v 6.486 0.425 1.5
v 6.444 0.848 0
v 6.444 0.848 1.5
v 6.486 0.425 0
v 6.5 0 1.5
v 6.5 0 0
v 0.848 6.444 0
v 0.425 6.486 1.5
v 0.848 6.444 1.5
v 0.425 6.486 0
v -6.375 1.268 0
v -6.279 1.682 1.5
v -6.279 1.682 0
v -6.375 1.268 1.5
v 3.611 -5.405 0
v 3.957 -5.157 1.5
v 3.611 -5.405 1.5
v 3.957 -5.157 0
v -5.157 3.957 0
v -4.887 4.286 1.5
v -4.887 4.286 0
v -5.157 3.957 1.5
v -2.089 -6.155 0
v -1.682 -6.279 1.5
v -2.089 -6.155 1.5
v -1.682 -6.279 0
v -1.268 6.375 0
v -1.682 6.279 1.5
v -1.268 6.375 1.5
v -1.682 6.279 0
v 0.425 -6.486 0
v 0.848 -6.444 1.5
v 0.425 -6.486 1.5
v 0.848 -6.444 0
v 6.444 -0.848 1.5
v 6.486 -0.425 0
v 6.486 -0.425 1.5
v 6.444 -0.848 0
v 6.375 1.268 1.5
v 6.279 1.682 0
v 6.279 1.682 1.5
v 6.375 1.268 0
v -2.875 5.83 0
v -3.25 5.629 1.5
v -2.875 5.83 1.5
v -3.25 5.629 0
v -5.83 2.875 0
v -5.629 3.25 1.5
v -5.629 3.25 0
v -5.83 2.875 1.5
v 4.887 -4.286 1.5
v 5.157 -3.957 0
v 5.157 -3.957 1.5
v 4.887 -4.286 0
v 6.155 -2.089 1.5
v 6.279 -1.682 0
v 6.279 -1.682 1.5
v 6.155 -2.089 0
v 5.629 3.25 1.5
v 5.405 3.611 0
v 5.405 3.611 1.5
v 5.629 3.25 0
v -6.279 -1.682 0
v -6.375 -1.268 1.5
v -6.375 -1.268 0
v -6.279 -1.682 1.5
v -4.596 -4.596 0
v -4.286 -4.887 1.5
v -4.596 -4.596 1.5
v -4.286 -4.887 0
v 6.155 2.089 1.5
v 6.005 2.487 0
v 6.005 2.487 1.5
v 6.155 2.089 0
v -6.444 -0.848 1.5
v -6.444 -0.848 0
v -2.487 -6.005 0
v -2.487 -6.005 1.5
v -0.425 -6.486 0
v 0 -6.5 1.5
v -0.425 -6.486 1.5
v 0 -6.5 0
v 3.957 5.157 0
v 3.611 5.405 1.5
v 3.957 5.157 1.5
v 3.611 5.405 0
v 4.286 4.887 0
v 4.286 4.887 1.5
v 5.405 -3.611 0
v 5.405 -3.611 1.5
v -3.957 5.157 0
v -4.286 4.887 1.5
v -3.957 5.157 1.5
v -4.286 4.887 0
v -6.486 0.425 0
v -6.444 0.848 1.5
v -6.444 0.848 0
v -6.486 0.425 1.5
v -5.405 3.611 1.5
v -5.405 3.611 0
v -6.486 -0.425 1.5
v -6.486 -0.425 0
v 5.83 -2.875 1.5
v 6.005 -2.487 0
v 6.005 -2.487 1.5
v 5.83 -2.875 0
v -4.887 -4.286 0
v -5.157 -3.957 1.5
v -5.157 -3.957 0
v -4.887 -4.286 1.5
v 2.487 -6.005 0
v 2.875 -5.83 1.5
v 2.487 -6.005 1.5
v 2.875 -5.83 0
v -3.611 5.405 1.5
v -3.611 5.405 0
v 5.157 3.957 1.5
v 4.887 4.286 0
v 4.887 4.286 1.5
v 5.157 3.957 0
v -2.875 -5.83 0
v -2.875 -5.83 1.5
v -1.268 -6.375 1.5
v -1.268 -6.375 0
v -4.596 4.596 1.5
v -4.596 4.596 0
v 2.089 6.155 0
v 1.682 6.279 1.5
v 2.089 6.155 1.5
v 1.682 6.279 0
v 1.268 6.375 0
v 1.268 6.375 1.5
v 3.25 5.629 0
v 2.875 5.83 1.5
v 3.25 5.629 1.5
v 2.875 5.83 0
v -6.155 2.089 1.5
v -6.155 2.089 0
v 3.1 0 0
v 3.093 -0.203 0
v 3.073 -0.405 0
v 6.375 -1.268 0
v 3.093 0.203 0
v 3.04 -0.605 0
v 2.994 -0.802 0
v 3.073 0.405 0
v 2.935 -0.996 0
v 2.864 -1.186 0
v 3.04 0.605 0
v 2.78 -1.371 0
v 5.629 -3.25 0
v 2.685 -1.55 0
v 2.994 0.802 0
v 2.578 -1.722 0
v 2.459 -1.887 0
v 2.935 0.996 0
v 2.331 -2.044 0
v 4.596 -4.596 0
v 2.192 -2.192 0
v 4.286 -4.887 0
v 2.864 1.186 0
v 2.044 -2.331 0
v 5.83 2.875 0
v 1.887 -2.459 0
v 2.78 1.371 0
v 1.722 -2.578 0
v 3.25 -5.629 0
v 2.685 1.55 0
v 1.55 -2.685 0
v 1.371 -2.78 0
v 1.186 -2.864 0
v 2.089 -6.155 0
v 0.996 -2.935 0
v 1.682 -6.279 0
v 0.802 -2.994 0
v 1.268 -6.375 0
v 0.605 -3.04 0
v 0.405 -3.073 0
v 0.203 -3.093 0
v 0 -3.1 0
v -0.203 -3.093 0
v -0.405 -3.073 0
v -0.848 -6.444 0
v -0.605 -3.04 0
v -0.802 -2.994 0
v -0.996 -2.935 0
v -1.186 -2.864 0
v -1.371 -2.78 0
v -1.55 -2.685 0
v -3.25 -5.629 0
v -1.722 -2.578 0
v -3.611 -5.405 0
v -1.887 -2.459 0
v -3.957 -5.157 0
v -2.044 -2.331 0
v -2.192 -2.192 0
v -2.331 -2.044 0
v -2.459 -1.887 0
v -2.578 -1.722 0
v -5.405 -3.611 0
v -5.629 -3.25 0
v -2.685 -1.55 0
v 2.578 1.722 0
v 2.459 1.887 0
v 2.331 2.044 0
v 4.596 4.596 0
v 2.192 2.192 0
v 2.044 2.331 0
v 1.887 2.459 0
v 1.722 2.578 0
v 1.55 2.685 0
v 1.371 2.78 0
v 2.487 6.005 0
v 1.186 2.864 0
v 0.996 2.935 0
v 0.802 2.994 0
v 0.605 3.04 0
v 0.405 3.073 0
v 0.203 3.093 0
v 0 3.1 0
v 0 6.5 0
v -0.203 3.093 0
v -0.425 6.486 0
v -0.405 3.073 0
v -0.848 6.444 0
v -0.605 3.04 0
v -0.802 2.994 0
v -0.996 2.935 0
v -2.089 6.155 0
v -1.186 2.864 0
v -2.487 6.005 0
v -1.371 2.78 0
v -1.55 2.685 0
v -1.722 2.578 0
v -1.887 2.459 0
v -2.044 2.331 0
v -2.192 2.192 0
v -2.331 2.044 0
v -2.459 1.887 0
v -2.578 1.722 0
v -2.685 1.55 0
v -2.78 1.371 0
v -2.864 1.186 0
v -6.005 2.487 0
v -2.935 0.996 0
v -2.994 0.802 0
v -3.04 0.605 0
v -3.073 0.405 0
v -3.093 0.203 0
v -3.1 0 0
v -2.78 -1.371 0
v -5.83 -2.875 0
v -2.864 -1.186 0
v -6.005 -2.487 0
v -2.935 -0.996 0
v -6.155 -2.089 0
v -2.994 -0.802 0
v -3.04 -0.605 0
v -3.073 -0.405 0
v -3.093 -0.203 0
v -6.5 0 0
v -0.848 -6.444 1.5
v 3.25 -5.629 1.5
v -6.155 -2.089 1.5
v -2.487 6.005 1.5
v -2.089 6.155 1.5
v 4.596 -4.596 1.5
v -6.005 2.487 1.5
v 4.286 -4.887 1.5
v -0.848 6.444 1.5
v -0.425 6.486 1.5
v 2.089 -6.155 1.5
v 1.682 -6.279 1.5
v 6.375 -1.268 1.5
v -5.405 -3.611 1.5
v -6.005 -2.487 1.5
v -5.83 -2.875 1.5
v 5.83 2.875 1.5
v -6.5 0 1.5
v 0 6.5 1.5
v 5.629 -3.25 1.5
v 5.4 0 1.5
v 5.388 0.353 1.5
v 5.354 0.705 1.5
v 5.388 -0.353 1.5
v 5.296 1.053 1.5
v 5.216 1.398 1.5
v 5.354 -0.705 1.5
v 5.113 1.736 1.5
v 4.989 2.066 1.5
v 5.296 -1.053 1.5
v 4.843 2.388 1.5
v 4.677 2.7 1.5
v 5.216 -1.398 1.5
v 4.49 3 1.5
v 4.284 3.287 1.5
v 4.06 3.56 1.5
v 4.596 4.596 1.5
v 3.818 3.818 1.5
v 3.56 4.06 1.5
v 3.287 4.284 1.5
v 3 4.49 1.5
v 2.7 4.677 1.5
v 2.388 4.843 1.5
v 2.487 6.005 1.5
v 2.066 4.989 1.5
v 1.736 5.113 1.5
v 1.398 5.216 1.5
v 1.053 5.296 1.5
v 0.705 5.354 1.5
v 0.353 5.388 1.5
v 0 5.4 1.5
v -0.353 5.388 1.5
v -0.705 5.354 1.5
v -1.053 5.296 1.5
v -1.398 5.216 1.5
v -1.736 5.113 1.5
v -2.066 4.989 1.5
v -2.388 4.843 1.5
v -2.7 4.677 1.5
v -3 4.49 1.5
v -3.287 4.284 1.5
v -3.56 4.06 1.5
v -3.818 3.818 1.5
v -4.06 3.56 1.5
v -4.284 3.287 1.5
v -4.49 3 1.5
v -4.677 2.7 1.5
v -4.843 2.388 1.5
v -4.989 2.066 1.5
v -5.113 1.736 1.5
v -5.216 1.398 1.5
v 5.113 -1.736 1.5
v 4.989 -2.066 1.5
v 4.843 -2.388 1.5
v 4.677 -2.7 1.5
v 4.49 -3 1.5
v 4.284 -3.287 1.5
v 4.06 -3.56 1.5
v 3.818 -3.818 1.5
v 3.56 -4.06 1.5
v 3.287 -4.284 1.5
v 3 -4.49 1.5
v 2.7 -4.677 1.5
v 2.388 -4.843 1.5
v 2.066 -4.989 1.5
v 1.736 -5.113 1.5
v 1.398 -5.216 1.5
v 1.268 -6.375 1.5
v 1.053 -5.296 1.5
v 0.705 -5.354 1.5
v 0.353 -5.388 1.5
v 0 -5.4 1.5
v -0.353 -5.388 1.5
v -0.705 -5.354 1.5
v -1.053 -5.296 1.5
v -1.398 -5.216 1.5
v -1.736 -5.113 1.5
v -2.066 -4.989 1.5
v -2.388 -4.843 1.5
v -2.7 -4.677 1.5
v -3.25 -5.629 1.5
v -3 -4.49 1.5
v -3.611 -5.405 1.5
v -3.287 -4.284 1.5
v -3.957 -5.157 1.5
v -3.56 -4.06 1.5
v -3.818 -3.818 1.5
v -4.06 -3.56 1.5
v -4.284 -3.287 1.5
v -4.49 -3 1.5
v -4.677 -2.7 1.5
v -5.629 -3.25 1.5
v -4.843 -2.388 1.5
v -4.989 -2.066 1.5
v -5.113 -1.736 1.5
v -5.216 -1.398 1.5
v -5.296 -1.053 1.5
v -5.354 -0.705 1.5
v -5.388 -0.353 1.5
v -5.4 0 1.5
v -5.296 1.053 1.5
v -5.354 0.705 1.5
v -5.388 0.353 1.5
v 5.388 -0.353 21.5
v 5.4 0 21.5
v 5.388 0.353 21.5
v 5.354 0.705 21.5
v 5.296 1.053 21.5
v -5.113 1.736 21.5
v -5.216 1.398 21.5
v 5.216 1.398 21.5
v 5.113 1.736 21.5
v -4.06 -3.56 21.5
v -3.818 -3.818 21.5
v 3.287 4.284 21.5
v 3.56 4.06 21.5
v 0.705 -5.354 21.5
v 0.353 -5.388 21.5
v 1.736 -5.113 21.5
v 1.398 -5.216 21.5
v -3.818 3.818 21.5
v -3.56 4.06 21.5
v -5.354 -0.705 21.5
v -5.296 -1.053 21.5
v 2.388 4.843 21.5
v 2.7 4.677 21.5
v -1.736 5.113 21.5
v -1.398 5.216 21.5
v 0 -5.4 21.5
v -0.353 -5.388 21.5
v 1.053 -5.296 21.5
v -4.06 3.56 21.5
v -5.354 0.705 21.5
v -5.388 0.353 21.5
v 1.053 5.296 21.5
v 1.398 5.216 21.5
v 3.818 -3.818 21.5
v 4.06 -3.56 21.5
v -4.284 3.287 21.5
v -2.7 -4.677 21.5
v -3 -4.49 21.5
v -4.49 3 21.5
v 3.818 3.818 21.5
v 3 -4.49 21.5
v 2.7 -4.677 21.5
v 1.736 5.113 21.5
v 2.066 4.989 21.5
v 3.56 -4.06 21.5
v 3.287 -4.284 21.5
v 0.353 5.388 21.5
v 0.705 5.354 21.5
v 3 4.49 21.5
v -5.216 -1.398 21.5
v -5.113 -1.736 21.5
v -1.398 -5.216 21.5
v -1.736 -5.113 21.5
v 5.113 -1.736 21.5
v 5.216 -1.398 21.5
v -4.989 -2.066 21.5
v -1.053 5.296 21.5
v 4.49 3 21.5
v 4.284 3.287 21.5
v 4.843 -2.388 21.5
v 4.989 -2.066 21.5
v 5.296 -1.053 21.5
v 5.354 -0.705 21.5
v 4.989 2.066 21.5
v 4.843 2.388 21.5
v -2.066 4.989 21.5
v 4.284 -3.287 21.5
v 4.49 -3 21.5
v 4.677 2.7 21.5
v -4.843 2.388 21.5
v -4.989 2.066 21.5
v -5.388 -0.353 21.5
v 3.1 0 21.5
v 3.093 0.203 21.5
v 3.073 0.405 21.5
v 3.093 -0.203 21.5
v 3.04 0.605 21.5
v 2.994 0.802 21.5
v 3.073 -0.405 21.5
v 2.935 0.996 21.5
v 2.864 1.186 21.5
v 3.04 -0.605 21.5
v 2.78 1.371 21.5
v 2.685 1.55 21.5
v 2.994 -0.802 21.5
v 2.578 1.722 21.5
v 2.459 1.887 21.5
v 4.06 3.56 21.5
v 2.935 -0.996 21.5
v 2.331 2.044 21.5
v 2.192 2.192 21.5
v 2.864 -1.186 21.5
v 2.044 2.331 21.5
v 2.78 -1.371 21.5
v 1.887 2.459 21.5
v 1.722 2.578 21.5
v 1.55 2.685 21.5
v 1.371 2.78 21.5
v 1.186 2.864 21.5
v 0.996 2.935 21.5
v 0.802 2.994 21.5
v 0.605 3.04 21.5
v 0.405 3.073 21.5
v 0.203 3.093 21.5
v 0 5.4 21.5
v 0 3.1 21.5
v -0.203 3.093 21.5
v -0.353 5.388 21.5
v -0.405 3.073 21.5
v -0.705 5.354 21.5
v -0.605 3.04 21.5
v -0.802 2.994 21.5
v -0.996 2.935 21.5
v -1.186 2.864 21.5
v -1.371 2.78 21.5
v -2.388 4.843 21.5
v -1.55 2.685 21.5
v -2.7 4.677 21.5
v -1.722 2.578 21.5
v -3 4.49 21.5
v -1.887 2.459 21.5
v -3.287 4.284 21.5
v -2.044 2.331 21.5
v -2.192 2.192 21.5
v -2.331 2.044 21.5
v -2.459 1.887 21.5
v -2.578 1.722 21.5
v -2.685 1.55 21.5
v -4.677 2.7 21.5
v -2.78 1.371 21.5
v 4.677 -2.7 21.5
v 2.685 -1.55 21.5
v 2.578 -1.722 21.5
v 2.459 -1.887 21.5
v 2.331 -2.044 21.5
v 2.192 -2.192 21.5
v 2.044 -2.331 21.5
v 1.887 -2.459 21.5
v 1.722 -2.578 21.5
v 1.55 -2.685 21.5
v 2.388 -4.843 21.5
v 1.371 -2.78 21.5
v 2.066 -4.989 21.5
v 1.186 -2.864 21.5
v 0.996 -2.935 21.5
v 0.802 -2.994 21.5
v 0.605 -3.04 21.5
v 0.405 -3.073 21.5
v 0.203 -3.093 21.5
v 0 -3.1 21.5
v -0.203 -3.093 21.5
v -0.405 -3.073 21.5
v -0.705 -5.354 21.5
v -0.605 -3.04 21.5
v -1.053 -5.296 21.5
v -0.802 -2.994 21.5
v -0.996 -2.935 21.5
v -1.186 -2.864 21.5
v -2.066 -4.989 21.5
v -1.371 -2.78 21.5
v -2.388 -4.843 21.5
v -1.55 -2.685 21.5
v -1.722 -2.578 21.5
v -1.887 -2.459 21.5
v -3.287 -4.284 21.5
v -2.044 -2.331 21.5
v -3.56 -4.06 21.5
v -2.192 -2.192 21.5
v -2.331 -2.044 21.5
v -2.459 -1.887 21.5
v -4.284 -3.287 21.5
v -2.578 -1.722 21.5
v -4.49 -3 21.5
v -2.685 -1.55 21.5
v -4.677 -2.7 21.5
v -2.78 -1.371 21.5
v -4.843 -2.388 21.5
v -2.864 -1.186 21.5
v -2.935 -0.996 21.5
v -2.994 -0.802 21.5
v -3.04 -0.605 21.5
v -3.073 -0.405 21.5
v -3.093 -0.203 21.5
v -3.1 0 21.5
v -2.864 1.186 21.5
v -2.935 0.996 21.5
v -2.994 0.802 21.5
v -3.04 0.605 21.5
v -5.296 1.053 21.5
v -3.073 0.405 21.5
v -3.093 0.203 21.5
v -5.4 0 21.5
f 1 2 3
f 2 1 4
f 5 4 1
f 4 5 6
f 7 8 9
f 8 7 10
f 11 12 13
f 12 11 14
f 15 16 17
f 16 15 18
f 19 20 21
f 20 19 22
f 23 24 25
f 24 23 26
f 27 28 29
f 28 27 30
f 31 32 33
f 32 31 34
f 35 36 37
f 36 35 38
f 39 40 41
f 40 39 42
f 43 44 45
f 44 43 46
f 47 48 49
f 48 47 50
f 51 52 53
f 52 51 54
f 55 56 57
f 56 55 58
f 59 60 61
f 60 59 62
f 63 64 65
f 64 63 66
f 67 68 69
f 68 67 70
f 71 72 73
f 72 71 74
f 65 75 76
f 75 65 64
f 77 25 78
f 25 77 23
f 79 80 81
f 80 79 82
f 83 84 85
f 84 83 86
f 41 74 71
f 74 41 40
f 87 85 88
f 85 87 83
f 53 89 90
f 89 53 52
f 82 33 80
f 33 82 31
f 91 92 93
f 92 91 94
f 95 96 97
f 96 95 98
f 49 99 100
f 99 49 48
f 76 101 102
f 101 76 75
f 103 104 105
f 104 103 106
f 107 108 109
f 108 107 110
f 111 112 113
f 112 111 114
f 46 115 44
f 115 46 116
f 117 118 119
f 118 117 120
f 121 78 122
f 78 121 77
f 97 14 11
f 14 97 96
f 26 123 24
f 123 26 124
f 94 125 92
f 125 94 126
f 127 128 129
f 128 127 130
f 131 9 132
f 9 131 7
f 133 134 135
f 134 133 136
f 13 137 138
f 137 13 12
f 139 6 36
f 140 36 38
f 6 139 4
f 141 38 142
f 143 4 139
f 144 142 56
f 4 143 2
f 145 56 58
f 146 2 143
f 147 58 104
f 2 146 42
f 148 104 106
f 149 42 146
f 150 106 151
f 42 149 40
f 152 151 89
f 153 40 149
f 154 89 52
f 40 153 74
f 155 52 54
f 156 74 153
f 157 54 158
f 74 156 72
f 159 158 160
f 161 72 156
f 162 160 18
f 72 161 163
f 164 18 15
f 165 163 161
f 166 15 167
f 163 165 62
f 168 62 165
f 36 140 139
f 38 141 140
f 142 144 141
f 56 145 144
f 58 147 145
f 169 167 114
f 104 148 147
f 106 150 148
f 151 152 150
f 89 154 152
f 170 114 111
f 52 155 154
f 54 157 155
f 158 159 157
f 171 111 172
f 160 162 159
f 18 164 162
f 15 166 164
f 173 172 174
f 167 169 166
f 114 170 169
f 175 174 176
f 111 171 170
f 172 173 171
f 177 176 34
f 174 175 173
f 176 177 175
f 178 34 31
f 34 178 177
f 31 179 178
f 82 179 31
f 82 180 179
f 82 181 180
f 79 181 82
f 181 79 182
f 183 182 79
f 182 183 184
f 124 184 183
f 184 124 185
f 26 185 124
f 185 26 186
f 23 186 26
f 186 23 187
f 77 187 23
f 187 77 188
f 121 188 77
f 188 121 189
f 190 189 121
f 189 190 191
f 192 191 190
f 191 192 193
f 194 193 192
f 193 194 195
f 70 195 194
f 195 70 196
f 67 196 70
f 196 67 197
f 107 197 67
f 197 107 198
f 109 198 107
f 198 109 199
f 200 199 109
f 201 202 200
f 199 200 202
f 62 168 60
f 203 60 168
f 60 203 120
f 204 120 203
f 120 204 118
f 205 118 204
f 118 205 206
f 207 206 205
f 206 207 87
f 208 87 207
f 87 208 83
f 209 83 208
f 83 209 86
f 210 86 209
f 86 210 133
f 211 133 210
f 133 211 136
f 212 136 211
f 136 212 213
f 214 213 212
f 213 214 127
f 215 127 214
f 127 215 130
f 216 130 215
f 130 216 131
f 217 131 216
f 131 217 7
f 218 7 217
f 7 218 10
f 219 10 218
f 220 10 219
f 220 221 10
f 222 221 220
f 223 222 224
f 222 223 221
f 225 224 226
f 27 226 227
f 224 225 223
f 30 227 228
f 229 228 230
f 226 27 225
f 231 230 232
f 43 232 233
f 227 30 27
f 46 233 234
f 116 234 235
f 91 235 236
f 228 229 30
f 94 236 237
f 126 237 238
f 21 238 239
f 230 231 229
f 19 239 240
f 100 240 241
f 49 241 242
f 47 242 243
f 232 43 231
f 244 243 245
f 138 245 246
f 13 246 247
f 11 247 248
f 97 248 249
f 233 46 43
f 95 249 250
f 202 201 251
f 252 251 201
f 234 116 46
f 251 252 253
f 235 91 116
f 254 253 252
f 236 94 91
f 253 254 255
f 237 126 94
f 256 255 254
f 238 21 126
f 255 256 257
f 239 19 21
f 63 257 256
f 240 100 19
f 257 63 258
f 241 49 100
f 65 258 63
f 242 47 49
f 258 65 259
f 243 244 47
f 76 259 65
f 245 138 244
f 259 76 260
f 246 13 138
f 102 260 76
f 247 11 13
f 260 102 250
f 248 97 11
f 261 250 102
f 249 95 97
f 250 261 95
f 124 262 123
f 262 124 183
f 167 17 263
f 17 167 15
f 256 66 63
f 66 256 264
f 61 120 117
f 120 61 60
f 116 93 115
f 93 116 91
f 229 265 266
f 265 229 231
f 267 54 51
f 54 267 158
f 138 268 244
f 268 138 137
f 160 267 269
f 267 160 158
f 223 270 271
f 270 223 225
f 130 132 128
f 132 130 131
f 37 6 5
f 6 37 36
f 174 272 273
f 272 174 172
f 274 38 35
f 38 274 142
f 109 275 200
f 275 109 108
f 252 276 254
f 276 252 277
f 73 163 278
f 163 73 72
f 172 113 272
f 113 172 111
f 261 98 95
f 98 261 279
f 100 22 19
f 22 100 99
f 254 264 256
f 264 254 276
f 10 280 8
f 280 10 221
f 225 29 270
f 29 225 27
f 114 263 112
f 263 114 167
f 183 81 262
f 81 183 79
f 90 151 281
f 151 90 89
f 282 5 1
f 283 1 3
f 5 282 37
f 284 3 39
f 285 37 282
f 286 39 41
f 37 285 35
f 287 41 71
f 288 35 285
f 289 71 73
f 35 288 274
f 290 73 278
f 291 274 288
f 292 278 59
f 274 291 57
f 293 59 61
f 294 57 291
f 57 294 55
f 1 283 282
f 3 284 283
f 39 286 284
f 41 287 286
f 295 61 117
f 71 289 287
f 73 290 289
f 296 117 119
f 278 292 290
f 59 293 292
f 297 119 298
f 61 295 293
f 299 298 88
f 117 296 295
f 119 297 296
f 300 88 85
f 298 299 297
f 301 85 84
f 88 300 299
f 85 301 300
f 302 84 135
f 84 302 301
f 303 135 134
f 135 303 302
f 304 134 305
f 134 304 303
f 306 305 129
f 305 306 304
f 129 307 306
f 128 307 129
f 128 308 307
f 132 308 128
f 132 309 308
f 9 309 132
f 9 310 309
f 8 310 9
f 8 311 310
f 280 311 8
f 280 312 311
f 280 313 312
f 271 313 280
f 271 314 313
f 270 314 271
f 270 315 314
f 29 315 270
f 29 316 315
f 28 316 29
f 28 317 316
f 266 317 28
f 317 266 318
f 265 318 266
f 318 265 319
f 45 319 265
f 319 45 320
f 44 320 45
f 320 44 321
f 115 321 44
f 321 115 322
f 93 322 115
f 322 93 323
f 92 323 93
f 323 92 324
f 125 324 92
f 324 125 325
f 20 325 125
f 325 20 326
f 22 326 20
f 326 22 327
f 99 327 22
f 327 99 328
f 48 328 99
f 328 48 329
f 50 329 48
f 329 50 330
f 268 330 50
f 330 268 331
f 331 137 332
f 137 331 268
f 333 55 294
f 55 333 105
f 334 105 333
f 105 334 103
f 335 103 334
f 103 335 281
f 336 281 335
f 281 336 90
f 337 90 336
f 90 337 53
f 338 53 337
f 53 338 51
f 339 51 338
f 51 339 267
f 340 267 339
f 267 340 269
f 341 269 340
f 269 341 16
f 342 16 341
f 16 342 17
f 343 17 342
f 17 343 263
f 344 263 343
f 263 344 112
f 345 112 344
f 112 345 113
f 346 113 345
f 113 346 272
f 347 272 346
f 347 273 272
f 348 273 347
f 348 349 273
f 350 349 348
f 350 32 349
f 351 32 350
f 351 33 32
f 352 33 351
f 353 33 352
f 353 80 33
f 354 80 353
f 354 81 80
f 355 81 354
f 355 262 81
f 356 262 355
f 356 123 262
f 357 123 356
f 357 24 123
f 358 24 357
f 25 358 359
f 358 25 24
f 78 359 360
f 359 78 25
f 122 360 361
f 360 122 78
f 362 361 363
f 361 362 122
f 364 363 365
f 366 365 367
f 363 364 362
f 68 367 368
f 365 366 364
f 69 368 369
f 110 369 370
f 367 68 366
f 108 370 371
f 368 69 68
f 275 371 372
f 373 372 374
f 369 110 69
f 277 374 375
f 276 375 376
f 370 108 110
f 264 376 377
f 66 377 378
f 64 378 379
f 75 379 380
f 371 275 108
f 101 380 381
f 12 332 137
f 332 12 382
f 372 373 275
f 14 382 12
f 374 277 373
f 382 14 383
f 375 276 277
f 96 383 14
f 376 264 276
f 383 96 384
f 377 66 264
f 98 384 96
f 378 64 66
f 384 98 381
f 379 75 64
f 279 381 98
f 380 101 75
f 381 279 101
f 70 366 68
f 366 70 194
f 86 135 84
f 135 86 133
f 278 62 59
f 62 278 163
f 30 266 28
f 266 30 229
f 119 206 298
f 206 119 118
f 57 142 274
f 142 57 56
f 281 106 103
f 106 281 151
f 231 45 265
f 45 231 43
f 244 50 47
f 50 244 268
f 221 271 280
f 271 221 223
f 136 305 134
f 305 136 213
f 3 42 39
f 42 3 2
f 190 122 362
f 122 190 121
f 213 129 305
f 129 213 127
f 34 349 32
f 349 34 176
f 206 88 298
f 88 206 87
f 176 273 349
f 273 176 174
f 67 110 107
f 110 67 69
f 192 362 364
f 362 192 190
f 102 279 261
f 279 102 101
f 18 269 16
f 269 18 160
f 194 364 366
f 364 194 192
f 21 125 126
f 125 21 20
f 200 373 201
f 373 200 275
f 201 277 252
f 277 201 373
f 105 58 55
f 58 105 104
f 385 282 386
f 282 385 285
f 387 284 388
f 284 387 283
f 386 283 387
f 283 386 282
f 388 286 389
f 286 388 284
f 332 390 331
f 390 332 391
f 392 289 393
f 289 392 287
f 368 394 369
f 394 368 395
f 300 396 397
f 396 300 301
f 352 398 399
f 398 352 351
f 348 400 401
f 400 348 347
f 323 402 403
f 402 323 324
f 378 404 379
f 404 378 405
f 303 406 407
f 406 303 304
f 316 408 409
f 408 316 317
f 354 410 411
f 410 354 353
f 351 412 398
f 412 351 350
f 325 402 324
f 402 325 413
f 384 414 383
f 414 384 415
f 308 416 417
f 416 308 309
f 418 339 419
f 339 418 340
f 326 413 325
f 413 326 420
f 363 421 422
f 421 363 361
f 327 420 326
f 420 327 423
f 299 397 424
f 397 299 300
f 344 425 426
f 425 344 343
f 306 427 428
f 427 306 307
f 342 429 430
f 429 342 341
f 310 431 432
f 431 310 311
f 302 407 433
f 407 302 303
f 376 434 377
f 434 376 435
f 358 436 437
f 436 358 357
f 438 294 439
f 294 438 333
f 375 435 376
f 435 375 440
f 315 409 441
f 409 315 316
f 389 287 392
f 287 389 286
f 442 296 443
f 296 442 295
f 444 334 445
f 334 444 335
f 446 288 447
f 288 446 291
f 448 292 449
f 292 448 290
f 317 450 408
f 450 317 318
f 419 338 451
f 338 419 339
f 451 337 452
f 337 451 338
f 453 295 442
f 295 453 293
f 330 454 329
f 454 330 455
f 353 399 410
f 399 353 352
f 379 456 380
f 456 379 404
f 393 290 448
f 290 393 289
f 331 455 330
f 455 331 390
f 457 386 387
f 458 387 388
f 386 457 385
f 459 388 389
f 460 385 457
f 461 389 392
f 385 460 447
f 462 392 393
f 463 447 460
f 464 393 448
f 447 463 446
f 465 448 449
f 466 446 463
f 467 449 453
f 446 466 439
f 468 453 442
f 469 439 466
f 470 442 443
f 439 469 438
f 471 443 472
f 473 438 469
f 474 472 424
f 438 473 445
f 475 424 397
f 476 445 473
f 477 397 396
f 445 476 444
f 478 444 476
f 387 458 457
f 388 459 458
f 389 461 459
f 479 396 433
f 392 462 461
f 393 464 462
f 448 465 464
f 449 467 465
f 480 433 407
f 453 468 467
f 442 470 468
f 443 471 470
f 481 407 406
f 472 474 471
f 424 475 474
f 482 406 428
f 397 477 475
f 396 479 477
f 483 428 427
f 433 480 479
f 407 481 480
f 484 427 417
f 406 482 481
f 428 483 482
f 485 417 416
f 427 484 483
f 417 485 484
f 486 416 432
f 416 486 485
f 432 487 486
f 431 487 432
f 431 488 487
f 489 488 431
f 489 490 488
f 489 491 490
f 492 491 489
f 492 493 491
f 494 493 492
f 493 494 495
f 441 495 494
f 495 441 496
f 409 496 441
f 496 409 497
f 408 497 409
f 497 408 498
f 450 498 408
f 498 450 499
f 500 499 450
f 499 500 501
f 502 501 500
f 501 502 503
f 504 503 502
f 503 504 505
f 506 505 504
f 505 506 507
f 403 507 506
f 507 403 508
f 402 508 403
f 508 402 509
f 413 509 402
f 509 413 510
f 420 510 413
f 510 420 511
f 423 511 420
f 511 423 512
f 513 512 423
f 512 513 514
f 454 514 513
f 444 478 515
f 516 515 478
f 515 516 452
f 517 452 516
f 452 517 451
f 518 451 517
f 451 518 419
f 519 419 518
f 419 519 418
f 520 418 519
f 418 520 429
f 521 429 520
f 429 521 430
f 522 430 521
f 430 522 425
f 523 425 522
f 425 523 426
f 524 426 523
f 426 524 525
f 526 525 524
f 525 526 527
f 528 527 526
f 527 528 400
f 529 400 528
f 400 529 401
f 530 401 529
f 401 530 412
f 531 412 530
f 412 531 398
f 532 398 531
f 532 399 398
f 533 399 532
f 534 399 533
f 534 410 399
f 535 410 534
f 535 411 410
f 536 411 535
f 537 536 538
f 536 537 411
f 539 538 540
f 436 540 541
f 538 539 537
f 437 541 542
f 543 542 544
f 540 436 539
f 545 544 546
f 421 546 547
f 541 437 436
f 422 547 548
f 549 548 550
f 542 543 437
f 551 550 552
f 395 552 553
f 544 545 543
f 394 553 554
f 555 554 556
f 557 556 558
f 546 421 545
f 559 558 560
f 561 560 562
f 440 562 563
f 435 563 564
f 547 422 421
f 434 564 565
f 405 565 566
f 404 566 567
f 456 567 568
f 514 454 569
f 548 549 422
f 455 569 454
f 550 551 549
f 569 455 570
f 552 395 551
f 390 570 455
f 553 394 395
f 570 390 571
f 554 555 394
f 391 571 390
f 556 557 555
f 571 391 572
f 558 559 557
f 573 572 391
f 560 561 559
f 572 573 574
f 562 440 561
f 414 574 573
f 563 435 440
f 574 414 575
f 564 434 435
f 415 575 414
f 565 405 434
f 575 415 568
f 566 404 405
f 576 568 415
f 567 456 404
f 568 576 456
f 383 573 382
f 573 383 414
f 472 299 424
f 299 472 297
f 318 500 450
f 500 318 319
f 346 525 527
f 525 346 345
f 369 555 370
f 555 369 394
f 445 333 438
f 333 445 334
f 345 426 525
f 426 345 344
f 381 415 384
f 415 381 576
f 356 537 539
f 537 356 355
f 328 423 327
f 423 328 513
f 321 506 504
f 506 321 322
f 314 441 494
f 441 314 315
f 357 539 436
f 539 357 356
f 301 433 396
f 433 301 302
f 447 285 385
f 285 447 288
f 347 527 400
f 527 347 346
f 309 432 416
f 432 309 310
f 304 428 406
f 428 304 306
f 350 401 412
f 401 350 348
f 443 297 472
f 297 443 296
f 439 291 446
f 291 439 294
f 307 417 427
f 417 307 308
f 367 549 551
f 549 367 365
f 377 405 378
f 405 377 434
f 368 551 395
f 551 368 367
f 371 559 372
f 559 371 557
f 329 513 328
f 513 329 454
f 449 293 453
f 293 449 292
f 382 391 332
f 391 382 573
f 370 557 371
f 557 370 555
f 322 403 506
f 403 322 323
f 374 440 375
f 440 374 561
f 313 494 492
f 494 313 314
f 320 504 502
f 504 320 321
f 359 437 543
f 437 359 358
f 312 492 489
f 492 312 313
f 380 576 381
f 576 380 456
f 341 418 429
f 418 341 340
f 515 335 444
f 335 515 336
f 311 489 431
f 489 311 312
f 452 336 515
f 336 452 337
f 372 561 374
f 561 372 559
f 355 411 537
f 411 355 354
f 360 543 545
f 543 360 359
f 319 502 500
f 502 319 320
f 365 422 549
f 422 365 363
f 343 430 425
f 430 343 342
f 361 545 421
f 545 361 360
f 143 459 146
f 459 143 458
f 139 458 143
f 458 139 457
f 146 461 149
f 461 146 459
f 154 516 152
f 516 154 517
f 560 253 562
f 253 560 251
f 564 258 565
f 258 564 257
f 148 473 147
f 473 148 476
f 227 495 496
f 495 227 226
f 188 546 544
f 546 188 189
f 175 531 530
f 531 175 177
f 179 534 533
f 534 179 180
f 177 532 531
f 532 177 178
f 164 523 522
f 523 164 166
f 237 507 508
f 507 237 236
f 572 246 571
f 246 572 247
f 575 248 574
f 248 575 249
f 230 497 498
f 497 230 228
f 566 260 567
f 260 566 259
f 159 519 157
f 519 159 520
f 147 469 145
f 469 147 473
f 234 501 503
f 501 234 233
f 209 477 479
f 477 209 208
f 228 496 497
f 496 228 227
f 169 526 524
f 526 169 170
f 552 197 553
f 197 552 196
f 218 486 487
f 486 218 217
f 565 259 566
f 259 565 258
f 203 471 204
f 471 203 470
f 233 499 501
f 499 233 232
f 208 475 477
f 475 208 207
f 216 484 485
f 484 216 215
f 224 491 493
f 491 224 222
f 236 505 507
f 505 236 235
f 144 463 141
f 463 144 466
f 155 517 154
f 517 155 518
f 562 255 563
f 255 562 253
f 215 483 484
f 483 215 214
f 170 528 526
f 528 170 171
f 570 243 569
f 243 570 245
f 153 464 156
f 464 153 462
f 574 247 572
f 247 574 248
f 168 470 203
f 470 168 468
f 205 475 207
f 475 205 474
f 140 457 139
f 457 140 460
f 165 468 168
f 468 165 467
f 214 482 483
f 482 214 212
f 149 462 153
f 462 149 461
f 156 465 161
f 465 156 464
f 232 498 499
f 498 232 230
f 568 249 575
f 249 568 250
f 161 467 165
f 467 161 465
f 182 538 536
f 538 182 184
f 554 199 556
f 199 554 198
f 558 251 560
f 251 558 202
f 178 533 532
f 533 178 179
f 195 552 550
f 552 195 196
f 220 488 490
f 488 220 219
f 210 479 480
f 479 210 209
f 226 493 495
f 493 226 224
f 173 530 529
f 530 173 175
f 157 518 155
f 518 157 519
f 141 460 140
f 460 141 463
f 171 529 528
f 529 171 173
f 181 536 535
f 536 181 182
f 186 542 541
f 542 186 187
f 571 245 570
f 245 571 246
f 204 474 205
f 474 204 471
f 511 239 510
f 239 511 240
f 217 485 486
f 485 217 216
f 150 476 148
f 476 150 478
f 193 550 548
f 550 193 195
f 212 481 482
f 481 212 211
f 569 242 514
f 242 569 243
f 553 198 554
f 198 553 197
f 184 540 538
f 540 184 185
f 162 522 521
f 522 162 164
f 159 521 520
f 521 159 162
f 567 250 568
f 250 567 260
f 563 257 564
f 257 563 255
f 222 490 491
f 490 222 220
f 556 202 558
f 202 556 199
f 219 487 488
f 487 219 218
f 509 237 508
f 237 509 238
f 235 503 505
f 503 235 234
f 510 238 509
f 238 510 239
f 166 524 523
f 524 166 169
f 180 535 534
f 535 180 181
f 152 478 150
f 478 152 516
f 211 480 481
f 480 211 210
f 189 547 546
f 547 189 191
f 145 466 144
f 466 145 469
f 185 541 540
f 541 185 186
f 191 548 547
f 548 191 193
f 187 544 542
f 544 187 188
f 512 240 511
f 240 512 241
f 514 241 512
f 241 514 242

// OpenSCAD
// PCR tube adapter sleeve: 0.2 mL tube in a 1.5 mL rack hole
// Print orientation: collar down on the bed (z = 0), sleeve up to z = 21.5

// ---------- Dimensions (mm) ----------
collar_d      = 13;    // collar outer diameter
collar_h      = 1.5;   // collar thickness (z = 0 to 1.5)
sleeve_od     = 10.8;  // sleeve body outer diameter
sleeve_top_z  = 21.5;  // top of sleeve body
bore_d        = 6.2;   // through-bore diameter
eps           = 0.5;   // cutter overshoot past faces

$fn = 96;

// ---------- Model ----------
difference() {
    union() {
        // Collar
        cylinder(d = collar_d, h = collar_h);
        // Sleeve body, overlapping slightly into the collar for a clean union
        translate([0, 0, collar_h - 0.01])
            cylinder(d = sleeve_od, h = sleeve_top_z - collar_h + 0.01);
    }
    // Full-height bore, open at both ends
    translate([0, 0, -eps])
        cylinder(d = bore_d, h = sleeve_top_z + 2 * eps);
}
